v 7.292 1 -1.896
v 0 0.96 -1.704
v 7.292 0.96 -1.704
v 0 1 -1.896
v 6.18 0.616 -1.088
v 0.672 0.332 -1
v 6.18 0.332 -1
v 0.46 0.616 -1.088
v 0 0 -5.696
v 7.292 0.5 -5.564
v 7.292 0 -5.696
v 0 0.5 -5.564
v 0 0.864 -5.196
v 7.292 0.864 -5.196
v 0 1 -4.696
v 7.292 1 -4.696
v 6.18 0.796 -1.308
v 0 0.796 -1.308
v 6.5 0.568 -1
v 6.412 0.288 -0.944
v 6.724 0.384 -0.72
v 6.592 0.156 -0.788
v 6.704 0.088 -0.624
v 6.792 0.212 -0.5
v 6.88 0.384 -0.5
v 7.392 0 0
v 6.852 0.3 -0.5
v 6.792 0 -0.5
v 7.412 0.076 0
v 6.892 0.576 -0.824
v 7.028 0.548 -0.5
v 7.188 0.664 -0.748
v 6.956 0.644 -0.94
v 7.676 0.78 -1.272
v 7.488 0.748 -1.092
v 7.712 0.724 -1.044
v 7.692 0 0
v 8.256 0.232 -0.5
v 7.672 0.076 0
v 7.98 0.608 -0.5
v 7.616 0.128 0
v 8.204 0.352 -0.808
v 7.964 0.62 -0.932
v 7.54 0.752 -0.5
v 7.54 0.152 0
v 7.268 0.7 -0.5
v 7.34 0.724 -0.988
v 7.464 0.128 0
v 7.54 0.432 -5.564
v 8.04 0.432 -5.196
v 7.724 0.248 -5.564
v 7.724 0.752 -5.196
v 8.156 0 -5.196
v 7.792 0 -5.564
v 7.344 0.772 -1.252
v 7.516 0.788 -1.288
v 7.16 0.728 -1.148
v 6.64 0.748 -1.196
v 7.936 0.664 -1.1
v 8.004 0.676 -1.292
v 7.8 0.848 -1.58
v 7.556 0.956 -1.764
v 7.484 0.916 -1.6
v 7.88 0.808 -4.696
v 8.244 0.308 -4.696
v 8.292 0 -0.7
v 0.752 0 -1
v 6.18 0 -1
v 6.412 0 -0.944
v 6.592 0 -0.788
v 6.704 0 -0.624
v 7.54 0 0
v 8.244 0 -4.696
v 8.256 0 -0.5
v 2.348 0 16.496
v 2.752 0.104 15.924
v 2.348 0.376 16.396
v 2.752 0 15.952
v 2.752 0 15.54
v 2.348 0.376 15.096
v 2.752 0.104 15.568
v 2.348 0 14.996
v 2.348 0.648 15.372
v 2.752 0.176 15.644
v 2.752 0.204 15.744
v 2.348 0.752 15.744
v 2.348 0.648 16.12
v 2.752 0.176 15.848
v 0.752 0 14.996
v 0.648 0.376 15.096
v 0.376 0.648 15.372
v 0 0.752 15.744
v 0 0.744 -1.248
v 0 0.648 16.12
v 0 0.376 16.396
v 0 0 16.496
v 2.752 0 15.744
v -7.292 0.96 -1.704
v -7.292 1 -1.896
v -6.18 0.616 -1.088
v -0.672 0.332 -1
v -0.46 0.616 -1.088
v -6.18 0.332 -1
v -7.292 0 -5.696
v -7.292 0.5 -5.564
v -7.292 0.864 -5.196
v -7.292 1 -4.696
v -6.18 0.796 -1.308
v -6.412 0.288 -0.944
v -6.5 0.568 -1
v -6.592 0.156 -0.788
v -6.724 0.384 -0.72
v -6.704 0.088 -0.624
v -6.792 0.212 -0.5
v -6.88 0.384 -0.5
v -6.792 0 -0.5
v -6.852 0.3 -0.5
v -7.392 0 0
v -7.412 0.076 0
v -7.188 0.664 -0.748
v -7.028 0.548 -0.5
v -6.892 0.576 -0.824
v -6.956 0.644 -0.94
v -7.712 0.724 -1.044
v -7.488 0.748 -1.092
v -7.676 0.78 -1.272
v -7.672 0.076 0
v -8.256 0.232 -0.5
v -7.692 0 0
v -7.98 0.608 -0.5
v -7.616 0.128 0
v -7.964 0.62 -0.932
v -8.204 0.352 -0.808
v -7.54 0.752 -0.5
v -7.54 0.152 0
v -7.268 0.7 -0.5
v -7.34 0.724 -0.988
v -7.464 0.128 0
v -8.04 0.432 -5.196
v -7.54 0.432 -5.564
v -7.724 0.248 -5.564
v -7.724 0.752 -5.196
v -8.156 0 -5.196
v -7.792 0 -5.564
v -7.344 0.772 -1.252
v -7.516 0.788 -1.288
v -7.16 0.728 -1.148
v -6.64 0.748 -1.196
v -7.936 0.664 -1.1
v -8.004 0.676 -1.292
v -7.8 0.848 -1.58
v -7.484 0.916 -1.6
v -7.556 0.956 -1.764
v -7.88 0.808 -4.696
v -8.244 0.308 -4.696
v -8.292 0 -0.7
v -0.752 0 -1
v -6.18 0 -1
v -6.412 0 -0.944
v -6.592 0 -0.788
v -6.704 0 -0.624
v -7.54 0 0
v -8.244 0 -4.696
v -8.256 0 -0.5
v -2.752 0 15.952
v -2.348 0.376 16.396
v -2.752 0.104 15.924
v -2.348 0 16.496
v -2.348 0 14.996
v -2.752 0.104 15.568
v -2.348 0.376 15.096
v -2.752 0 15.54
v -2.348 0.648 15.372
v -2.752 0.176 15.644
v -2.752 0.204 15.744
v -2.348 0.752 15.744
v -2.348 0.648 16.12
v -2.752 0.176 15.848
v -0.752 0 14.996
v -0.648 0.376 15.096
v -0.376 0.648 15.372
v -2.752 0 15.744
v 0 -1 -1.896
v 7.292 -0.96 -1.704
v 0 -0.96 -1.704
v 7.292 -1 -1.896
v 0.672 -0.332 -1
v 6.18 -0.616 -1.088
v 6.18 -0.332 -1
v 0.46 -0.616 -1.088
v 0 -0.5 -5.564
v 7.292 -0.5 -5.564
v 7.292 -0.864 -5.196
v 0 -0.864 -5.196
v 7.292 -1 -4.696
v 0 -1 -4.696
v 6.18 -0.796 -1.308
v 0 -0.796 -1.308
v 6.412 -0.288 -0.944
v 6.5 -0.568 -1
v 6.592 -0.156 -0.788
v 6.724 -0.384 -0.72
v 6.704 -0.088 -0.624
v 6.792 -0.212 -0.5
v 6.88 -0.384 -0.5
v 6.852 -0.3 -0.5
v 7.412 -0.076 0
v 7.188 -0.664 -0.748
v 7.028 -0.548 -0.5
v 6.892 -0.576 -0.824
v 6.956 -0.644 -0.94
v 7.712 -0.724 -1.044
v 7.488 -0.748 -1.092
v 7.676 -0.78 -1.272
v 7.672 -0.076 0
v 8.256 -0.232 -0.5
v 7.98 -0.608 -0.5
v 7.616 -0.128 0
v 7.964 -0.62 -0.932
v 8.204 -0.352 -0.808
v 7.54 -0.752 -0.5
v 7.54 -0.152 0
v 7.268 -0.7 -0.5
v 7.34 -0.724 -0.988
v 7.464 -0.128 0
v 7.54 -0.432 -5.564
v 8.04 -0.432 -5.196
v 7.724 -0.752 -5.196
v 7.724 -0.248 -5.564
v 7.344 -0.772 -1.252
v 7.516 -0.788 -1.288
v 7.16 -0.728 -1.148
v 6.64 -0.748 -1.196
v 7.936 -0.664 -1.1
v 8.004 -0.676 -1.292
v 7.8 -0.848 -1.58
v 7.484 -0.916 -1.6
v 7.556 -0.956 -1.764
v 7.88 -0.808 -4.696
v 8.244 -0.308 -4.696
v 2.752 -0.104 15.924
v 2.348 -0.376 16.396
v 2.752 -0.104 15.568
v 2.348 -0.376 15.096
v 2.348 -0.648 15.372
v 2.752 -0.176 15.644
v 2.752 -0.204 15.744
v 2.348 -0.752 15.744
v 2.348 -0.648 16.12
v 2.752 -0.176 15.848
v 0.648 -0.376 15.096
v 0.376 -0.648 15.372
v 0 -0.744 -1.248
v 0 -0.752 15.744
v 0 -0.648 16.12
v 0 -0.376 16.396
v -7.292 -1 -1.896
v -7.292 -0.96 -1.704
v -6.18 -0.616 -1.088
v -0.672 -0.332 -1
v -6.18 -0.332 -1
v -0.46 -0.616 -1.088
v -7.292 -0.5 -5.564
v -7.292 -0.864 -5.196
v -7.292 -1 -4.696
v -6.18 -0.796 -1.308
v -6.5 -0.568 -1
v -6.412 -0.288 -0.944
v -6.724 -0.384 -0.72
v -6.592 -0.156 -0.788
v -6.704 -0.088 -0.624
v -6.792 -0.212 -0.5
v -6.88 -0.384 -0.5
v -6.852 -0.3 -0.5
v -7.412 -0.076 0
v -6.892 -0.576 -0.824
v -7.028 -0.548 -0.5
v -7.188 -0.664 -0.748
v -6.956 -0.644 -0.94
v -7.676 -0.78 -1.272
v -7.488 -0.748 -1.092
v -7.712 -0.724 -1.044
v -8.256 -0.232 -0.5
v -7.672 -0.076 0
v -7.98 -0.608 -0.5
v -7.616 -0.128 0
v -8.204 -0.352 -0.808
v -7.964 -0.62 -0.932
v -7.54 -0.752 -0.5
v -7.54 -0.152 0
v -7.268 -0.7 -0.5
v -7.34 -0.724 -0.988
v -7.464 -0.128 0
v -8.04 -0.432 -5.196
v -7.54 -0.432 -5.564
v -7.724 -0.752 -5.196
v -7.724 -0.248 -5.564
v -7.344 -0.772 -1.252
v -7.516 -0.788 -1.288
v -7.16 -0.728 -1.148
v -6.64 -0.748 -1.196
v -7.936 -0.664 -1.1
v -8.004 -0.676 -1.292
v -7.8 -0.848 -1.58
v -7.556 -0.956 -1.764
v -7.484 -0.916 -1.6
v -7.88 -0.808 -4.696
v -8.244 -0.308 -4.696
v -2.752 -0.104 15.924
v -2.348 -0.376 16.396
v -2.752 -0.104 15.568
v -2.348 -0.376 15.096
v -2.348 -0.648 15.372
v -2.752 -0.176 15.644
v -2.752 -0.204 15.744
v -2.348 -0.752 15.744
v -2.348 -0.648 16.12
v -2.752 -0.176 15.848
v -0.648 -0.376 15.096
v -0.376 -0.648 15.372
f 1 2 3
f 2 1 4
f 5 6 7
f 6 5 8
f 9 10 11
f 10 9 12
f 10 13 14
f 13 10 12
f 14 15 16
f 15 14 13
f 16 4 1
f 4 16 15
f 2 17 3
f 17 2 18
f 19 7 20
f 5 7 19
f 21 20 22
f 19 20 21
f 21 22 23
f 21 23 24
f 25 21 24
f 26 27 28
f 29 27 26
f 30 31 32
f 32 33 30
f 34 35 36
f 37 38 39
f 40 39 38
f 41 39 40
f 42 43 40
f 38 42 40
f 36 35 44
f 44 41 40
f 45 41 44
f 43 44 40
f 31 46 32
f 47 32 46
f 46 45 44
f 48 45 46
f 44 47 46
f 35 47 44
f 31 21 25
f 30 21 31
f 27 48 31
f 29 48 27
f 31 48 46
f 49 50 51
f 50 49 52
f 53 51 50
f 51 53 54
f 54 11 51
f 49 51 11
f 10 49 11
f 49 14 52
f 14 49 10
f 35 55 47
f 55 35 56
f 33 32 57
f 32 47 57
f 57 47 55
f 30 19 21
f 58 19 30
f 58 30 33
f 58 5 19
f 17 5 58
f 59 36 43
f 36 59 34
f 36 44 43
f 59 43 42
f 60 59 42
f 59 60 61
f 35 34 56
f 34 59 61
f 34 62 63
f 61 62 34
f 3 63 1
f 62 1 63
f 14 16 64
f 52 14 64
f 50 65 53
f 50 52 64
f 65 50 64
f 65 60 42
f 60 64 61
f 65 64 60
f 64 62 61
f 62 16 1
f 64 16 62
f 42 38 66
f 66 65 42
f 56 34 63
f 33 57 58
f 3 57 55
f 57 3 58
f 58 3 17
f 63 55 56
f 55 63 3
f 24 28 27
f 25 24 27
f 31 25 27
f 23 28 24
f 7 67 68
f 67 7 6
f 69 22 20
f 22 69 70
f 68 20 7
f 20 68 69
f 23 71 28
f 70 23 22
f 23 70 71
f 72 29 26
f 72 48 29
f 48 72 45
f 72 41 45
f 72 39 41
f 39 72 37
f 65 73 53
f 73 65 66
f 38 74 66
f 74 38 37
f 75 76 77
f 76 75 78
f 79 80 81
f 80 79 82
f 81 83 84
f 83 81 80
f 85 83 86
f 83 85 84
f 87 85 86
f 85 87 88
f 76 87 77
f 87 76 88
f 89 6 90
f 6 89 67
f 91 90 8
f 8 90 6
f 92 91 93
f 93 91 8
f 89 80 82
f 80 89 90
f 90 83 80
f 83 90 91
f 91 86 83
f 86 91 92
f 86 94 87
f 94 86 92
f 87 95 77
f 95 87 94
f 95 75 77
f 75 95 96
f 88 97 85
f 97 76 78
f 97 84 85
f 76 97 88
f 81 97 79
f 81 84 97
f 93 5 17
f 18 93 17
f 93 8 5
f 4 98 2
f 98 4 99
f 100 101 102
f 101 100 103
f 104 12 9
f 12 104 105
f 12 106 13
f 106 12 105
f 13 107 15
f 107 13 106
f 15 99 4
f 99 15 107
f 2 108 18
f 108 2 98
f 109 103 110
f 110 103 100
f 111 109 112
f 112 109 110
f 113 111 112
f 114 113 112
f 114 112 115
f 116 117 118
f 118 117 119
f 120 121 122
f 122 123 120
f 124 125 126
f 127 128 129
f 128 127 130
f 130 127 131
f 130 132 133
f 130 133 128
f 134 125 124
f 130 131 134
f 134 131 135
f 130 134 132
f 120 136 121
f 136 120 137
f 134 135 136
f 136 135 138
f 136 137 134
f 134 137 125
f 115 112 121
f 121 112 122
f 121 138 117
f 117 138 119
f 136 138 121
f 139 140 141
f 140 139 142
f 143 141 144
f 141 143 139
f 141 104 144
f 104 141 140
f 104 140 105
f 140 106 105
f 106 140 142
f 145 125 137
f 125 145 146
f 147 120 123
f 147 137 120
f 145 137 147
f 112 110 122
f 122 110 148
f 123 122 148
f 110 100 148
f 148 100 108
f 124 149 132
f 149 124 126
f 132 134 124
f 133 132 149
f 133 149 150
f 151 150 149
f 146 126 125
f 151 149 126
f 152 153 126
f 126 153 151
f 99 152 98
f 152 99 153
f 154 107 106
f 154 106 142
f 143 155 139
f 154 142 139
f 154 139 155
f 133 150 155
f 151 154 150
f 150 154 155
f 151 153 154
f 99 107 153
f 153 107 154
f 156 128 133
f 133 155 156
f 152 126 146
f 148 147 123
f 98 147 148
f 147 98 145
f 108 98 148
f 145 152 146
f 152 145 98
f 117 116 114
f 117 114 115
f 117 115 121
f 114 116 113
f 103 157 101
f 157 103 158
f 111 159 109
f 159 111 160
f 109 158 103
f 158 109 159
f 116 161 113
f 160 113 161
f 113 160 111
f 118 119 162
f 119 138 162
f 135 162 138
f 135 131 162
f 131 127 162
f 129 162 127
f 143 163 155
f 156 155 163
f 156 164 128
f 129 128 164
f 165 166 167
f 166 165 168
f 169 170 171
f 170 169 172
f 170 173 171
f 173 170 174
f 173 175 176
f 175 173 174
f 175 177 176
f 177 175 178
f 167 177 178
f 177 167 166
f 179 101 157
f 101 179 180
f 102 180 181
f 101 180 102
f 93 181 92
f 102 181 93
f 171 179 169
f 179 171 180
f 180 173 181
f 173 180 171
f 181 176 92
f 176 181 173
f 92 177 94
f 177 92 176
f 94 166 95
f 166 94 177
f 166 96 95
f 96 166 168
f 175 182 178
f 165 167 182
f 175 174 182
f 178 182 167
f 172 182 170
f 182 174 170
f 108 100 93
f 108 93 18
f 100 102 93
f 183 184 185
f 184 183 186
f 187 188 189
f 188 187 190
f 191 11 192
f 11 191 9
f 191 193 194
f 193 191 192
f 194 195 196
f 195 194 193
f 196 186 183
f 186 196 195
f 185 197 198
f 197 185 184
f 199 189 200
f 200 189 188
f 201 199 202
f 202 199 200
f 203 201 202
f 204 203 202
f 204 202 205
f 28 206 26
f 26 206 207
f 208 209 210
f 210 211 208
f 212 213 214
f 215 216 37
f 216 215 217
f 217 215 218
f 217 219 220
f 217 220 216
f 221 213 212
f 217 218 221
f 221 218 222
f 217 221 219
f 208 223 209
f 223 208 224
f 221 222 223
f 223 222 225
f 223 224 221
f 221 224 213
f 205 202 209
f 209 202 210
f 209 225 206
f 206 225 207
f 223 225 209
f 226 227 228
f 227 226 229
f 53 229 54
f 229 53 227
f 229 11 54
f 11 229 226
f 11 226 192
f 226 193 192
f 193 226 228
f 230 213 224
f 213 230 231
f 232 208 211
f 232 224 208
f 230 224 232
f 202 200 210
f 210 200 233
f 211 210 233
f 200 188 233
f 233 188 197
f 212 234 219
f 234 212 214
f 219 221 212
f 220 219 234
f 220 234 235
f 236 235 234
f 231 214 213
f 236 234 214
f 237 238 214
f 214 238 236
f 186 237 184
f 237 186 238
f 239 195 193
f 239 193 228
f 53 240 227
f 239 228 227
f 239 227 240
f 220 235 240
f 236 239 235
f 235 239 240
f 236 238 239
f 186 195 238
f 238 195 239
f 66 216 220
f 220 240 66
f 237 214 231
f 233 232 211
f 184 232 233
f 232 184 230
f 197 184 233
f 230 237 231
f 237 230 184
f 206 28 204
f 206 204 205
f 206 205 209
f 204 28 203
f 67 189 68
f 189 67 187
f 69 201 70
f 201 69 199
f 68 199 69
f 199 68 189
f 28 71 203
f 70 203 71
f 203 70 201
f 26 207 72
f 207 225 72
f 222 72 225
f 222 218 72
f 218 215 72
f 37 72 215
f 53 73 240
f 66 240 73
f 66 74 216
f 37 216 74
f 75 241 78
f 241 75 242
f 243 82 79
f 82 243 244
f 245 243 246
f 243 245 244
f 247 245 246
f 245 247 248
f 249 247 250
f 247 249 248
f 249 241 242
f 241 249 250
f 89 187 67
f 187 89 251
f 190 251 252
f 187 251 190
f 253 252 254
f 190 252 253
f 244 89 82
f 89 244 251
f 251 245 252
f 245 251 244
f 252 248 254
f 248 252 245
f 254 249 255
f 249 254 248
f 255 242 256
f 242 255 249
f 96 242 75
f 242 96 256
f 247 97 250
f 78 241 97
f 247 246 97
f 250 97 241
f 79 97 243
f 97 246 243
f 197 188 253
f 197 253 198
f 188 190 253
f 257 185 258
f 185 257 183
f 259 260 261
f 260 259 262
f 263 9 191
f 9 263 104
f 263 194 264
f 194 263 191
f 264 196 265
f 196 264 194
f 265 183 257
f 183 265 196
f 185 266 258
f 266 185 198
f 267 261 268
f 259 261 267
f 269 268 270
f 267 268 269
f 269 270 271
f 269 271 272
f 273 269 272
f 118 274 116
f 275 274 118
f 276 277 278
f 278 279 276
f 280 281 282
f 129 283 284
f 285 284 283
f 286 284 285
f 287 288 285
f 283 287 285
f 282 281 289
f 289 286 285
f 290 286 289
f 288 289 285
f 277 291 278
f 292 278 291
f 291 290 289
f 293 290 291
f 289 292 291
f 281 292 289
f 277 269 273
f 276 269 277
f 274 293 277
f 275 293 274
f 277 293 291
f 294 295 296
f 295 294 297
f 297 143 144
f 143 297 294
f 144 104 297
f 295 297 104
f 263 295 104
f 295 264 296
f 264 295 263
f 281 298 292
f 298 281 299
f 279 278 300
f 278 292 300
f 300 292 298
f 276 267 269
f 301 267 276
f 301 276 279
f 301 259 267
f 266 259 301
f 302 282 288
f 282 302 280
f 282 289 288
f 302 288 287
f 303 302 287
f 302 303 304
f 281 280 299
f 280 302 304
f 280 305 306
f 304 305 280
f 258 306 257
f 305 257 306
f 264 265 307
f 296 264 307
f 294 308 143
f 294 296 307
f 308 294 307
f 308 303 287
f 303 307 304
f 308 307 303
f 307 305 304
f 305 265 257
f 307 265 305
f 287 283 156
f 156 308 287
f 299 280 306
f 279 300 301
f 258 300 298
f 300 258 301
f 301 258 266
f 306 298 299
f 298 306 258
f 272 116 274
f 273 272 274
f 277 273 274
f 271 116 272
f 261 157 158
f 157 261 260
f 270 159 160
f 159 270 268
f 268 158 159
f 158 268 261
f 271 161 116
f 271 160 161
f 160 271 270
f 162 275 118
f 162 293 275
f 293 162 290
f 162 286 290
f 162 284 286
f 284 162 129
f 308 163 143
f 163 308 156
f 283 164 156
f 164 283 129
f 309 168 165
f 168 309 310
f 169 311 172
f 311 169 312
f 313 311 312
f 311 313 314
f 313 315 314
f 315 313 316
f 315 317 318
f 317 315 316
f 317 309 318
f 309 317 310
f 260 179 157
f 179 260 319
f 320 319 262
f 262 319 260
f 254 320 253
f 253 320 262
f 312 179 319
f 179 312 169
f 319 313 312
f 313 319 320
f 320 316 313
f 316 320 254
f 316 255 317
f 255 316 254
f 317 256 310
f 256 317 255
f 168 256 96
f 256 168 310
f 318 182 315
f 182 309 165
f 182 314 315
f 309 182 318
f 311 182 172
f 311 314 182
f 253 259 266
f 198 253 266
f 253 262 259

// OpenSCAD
// file: 40359b.scad
use <../lib.scad>
use <s/40359bs01.scad>
function ldraw_lib__40359b() = [
// 0 ~Sprue for 2 Minifig Keys
// 0 Name: 40359b.dat
// 0 Author: Andy Westrate [westrate]
// 0 !LDRAW_ORG Part UPDATE 2020-02
// 0 !LICENSE Licensed under CC BY 2.0 and CC BY 4.0 : see CAreadme.txt
// 
// 0 BFC CERTIFY CCW
  [0,"BFC","CERTIFY"],
  [0,"BFC","CCW"],
// 
// 0 !CATEGORY Minifig Accessory
// 
// 0 !HISTORY 2009-10-13 {LEGO Universe Team} Original part shape
// 0 !HISTORY 2009-11-12 [westrate] File preparation for LDraw Parts Tracker
// 0 !HISTORY 2020-06-28 [PTadmin] Official Update 2020-01
// 0 !HISTORY 2020-08-05 [PTadmin] Renamed from 62809
// 0 !HISTORY 2020-09-05 [PTadmin] Official Update 2020-02
// 
// 
// 1 16 0 0 0 1 0 0 0 1 0 0 0 1 s\40359bs01.dat
  [1,16,0,0,0,1,0,0,0,1,0,0,0,1, ldraw_lib__s__40359bs01()],
// 1 16 0 0 0 -1 0 0 0 1 0 0 0 1 s\40359bs01.dat
  [1,16,0,0,0,-1,0,0,0,1,0,0,0,1, ldraw_lib__s__40359bs01()],
// 1 16 0 0 0 1 0 0 0 1 0 0 0 -1 s\40359bs01.dat
  [1,16,0,0,0,1,0,0,0,1,0,0,0,-1, ldraw_lib__s__40359bs01()],
// 1 16 0 0 0 -1 0 0 0 1 0 0 0 -1 s\40359bs01.dat
  [1,16,0,0,0,-1,0,0,0,1,0,0,0,-1, ldraw_lib__s__40359bs01()],
// 0
];
makepoly(ldraw_lib__40359b(), line=0.2);
// main file
use <../lib.scad>
use <40359b.scad>
function ldraw_lib__62809() = [
// 0 ~Moved to 40359b
// 0 Name: 62809.dat
// 0 Author: [PTadmin]
// 0 !LDRAW_ORG Part UPDATE 2020-02
// 0 !LICENSE Licensed under CC BY 4.0 : see CAreadme.txt
// 
// 0 BFC CERTIFY CCW
  [0,"BFC","CERTIFY"],
  [0,"BFC","CCW"],
// 
// 0 !HISTORY 2020-09-05 [PTadmin] Official Update 2020-02
// 
// 
// 0 // ~Sprue for 2 Minifig Keys
// 1 16 0 0 0 1 0 0 0 1 0 0 0 1 40359b.dat
  [1,16,0,0,0,1,0,0,0,1,0,0,0,1, ldraw_lib__40359b()],
];
makepoly(ldraw_lib__62809(), line=0.2);
